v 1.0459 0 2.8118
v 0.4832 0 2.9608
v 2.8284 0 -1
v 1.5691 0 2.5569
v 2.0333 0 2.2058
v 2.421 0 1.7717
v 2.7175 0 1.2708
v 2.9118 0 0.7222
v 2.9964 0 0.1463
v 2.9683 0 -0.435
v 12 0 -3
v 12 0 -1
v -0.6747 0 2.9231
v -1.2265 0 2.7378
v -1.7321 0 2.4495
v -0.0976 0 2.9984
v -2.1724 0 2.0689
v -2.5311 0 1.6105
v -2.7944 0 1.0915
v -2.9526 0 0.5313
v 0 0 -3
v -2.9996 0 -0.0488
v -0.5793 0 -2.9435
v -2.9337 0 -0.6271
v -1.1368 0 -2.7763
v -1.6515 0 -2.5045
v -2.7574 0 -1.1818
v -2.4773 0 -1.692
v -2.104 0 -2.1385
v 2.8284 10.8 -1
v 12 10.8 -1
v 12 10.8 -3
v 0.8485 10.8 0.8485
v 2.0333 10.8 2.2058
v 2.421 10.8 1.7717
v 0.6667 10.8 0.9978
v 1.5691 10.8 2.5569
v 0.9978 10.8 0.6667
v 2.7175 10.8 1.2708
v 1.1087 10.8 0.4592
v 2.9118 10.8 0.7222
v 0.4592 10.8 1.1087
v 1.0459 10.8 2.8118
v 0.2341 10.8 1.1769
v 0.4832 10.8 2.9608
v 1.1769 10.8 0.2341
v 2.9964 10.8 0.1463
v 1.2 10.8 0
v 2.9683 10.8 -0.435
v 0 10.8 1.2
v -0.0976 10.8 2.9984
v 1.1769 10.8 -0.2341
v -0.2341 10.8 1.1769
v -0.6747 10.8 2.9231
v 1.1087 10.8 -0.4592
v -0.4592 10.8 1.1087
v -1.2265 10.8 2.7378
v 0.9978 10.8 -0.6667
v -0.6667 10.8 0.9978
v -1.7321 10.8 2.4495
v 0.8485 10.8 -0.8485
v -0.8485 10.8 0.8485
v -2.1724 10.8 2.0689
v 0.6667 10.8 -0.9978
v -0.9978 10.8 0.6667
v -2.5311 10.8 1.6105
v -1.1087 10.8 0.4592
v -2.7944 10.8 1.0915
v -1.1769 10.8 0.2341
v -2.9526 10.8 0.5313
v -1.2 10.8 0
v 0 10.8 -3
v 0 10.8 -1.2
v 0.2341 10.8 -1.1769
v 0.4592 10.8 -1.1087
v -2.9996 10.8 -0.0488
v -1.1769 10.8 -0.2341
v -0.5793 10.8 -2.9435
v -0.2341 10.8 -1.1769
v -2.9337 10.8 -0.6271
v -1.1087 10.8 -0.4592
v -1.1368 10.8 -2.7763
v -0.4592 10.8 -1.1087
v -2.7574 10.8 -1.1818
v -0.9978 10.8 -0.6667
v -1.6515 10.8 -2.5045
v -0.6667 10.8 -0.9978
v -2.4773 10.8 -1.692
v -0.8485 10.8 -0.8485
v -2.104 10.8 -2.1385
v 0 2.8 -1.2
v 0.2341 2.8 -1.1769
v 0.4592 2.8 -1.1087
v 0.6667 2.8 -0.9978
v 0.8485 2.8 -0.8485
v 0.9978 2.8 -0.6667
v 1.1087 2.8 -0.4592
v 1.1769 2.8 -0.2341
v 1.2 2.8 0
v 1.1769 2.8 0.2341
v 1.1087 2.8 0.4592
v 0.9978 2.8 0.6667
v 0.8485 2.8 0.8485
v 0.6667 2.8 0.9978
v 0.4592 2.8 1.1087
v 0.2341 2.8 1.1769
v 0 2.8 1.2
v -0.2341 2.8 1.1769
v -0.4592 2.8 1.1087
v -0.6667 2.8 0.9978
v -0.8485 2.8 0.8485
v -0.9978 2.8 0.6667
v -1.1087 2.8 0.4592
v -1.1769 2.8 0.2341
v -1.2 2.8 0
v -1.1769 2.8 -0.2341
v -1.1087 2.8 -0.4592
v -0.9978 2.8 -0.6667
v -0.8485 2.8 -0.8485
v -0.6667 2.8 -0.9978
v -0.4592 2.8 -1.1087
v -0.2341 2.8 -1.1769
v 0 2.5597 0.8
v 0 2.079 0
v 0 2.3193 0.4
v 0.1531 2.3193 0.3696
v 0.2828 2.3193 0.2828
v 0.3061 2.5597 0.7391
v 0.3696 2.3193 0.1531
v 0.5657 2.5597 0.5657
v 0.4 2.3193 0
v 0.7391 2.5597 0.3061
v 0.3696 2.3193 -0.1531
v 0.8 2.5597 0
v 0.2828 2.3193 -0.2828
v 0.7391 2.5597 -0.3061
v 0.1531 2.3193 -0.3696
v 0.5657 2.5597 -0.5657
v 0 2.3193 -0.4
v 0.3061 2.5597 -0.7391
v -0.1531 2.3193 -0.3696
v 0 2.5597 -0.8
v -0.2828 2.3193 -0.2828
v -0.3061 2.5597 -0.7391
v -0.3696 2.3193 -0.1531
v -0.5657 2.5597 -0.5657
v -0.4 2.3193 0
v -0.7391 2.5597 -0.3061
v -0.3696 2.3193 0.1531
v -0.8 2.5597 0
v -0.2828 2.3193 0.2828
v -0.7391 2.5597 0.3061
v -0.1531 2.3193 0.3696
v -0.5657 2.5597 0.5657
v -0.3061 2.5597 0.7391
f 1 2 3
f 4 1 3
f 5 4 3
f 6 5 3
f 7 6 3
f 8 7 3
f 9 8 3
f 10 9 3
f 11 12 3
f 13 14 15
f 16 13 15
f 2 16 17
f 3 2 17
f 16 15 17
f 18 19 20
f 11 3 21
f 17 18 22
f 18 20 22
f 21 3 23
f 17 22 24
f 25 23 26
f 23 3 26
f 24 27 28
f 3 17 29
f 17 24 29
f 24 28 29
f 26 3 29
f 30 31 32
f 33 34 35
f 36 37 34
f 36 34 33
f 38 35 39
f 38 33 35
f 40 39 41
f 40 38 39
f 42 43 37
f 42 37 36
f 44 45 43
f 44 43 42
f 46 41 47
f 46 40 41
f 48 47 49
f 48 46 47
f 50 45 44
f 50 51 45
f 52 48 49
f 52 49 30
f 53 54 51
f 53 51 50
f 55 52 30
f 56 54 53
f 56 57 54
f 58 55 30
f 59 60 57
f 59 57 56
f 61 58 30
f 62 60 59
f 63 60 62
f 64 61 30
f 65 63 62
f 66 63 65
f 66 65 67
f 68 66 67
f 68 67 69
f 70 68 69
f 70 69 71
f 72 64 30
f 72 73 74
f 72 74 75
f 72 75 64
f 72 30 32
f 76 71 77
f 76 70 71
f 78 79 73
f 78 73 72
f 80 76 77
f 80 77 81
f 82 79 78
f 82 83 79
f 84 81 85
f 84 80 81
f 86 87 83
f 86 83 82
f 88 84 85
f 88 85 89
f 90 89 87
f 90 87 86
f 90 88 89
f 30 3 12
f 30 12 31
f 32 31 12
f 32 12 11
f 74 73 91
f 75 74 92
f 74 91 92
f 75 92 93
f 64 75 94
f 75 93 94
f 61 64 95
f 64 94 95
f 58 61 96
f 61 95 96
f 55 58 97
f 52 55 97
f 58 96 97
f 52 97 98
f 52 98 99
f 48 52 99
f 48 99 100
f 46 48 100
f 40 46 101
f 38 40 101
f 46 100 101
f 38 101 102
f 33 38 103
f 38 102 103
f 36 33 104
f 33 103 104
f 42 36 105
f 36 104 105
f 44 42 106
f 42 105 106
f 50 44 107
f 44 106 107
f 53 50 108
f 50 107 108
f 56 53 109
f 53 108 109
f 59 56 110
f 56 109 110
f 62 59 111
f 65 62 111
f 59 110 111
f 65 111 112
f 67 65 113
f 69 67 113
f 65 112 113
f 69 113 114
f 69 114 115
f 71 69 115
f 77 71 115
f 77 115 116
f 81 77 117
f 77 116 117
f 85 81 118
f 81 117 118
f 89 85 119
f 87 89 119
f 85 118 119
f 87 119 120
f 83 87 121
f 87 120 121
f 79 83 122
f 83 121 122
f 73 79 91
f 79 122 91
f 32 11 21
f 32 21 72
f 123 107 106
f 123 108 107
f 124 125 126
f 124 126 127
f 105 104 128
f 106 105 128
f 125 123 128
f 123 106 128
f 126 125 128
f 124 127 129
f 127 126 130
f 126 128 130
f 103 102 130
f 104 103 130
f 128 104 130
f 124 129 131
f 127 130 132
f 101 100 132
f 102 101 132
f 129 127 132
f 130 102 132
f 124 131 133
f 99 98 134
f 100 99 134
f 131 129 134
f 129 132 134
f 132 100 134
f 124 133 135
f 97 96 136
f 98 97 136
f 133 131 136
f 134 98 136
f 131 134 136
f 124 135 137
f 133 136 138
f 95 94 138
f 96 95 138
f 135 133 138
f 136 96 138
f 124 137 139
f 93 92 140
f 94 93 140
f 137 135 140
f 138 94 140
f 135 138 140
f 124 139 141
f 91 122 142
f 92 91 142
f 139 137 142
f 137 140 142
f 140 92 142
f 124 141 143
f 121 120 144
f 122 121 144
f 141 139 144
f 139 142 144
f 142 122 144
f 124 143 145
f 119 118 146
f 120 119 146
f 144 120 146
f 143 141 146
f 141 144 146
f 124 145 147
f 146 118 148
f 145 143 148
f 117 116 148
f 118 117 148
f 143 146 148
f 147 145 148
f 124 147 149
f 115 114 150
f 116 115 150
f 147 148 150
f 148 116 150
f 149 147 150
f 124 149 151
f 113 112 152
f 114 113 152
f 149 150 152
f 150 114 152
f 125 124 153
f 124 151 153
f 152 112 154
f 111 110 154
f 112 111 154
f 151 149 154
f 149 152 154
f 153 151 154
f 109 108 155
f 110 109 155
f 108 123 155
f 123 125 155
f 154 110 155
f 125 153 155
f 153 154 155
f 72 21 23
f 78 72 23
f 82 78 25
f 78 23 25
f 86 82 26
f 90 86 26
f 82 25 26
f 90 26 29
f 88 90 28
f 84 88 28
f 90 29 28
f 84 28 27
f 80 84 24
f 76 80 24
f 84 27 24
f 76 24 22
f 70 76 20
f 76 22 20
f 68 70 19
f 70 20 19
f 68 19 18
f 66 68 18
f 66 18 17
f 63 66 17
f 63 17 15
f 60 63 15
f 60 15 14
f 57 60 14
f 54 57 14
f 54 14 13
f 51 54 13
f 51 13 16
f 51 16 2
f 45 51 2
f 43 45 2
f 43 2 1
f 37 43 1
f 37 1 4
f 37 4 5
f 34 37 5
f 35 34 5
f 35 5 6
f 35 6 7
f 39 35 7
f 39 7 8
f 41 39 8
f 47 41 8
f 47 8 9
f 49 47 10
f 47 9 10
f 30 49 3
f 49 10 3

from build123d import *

# Parameters (mm, degrees)
SKETCH_1_R      = 3
EXTRUDE_1_DEPTH = 10.8
SKETCH_7_W      = 2
SKETCH_7_H      = 10.8
EXTRUDE_2_DEPTH = 12
ST2_2_1_D       = 2.4
ST2_2_1_DEPTH   = 8
ST2_2_1_TIP     = 0.721032743


with BuildPart() as part:
    # 草图1 → 凸台-拉伸1 (new body)
    with BuildSketch(Plane(origin=(0, 0, 0), x_dir=(1, 0, 0), z_dir=(0, 1, 0))):
        with Locations(Location((0, 0, 0), (0, 0, 90))):
            Circle(SKETCH_1_R)
    extrude(amount=EXTRUDE_1_DEPTH)

    # 草图7 → 凸台-拉伸2 (add)
    with BuildSketch(Plane(origin=(0, 0, 0), x_dir=(0, 0, -1), z_dir=(1, 0, 0))):
        with Locations((2, 5.4)):
            Rectangle(SKETCH_7_W, SKETCH_7_H)
    extrude(amount=EXTRUDE_2_DEPTH)

    # ST2.2 间隙孔1
    with Locations(Plane.ZX.offset(10.8)):
        with Locations((0, 0)):
            Hole(ST2_2_1_D / 2, depth=ST2_2_1_DEPTH)
            with Locations((0, 0, -(ST2_2_1_DEPTH + ST2_2_1_TIP / 2))):  # 118° drill point
                Cone(0, ST2_2_1_D / 2, ST2_2_1_TIP, mode=Mode.SUBTRACT)


solid = part.part
